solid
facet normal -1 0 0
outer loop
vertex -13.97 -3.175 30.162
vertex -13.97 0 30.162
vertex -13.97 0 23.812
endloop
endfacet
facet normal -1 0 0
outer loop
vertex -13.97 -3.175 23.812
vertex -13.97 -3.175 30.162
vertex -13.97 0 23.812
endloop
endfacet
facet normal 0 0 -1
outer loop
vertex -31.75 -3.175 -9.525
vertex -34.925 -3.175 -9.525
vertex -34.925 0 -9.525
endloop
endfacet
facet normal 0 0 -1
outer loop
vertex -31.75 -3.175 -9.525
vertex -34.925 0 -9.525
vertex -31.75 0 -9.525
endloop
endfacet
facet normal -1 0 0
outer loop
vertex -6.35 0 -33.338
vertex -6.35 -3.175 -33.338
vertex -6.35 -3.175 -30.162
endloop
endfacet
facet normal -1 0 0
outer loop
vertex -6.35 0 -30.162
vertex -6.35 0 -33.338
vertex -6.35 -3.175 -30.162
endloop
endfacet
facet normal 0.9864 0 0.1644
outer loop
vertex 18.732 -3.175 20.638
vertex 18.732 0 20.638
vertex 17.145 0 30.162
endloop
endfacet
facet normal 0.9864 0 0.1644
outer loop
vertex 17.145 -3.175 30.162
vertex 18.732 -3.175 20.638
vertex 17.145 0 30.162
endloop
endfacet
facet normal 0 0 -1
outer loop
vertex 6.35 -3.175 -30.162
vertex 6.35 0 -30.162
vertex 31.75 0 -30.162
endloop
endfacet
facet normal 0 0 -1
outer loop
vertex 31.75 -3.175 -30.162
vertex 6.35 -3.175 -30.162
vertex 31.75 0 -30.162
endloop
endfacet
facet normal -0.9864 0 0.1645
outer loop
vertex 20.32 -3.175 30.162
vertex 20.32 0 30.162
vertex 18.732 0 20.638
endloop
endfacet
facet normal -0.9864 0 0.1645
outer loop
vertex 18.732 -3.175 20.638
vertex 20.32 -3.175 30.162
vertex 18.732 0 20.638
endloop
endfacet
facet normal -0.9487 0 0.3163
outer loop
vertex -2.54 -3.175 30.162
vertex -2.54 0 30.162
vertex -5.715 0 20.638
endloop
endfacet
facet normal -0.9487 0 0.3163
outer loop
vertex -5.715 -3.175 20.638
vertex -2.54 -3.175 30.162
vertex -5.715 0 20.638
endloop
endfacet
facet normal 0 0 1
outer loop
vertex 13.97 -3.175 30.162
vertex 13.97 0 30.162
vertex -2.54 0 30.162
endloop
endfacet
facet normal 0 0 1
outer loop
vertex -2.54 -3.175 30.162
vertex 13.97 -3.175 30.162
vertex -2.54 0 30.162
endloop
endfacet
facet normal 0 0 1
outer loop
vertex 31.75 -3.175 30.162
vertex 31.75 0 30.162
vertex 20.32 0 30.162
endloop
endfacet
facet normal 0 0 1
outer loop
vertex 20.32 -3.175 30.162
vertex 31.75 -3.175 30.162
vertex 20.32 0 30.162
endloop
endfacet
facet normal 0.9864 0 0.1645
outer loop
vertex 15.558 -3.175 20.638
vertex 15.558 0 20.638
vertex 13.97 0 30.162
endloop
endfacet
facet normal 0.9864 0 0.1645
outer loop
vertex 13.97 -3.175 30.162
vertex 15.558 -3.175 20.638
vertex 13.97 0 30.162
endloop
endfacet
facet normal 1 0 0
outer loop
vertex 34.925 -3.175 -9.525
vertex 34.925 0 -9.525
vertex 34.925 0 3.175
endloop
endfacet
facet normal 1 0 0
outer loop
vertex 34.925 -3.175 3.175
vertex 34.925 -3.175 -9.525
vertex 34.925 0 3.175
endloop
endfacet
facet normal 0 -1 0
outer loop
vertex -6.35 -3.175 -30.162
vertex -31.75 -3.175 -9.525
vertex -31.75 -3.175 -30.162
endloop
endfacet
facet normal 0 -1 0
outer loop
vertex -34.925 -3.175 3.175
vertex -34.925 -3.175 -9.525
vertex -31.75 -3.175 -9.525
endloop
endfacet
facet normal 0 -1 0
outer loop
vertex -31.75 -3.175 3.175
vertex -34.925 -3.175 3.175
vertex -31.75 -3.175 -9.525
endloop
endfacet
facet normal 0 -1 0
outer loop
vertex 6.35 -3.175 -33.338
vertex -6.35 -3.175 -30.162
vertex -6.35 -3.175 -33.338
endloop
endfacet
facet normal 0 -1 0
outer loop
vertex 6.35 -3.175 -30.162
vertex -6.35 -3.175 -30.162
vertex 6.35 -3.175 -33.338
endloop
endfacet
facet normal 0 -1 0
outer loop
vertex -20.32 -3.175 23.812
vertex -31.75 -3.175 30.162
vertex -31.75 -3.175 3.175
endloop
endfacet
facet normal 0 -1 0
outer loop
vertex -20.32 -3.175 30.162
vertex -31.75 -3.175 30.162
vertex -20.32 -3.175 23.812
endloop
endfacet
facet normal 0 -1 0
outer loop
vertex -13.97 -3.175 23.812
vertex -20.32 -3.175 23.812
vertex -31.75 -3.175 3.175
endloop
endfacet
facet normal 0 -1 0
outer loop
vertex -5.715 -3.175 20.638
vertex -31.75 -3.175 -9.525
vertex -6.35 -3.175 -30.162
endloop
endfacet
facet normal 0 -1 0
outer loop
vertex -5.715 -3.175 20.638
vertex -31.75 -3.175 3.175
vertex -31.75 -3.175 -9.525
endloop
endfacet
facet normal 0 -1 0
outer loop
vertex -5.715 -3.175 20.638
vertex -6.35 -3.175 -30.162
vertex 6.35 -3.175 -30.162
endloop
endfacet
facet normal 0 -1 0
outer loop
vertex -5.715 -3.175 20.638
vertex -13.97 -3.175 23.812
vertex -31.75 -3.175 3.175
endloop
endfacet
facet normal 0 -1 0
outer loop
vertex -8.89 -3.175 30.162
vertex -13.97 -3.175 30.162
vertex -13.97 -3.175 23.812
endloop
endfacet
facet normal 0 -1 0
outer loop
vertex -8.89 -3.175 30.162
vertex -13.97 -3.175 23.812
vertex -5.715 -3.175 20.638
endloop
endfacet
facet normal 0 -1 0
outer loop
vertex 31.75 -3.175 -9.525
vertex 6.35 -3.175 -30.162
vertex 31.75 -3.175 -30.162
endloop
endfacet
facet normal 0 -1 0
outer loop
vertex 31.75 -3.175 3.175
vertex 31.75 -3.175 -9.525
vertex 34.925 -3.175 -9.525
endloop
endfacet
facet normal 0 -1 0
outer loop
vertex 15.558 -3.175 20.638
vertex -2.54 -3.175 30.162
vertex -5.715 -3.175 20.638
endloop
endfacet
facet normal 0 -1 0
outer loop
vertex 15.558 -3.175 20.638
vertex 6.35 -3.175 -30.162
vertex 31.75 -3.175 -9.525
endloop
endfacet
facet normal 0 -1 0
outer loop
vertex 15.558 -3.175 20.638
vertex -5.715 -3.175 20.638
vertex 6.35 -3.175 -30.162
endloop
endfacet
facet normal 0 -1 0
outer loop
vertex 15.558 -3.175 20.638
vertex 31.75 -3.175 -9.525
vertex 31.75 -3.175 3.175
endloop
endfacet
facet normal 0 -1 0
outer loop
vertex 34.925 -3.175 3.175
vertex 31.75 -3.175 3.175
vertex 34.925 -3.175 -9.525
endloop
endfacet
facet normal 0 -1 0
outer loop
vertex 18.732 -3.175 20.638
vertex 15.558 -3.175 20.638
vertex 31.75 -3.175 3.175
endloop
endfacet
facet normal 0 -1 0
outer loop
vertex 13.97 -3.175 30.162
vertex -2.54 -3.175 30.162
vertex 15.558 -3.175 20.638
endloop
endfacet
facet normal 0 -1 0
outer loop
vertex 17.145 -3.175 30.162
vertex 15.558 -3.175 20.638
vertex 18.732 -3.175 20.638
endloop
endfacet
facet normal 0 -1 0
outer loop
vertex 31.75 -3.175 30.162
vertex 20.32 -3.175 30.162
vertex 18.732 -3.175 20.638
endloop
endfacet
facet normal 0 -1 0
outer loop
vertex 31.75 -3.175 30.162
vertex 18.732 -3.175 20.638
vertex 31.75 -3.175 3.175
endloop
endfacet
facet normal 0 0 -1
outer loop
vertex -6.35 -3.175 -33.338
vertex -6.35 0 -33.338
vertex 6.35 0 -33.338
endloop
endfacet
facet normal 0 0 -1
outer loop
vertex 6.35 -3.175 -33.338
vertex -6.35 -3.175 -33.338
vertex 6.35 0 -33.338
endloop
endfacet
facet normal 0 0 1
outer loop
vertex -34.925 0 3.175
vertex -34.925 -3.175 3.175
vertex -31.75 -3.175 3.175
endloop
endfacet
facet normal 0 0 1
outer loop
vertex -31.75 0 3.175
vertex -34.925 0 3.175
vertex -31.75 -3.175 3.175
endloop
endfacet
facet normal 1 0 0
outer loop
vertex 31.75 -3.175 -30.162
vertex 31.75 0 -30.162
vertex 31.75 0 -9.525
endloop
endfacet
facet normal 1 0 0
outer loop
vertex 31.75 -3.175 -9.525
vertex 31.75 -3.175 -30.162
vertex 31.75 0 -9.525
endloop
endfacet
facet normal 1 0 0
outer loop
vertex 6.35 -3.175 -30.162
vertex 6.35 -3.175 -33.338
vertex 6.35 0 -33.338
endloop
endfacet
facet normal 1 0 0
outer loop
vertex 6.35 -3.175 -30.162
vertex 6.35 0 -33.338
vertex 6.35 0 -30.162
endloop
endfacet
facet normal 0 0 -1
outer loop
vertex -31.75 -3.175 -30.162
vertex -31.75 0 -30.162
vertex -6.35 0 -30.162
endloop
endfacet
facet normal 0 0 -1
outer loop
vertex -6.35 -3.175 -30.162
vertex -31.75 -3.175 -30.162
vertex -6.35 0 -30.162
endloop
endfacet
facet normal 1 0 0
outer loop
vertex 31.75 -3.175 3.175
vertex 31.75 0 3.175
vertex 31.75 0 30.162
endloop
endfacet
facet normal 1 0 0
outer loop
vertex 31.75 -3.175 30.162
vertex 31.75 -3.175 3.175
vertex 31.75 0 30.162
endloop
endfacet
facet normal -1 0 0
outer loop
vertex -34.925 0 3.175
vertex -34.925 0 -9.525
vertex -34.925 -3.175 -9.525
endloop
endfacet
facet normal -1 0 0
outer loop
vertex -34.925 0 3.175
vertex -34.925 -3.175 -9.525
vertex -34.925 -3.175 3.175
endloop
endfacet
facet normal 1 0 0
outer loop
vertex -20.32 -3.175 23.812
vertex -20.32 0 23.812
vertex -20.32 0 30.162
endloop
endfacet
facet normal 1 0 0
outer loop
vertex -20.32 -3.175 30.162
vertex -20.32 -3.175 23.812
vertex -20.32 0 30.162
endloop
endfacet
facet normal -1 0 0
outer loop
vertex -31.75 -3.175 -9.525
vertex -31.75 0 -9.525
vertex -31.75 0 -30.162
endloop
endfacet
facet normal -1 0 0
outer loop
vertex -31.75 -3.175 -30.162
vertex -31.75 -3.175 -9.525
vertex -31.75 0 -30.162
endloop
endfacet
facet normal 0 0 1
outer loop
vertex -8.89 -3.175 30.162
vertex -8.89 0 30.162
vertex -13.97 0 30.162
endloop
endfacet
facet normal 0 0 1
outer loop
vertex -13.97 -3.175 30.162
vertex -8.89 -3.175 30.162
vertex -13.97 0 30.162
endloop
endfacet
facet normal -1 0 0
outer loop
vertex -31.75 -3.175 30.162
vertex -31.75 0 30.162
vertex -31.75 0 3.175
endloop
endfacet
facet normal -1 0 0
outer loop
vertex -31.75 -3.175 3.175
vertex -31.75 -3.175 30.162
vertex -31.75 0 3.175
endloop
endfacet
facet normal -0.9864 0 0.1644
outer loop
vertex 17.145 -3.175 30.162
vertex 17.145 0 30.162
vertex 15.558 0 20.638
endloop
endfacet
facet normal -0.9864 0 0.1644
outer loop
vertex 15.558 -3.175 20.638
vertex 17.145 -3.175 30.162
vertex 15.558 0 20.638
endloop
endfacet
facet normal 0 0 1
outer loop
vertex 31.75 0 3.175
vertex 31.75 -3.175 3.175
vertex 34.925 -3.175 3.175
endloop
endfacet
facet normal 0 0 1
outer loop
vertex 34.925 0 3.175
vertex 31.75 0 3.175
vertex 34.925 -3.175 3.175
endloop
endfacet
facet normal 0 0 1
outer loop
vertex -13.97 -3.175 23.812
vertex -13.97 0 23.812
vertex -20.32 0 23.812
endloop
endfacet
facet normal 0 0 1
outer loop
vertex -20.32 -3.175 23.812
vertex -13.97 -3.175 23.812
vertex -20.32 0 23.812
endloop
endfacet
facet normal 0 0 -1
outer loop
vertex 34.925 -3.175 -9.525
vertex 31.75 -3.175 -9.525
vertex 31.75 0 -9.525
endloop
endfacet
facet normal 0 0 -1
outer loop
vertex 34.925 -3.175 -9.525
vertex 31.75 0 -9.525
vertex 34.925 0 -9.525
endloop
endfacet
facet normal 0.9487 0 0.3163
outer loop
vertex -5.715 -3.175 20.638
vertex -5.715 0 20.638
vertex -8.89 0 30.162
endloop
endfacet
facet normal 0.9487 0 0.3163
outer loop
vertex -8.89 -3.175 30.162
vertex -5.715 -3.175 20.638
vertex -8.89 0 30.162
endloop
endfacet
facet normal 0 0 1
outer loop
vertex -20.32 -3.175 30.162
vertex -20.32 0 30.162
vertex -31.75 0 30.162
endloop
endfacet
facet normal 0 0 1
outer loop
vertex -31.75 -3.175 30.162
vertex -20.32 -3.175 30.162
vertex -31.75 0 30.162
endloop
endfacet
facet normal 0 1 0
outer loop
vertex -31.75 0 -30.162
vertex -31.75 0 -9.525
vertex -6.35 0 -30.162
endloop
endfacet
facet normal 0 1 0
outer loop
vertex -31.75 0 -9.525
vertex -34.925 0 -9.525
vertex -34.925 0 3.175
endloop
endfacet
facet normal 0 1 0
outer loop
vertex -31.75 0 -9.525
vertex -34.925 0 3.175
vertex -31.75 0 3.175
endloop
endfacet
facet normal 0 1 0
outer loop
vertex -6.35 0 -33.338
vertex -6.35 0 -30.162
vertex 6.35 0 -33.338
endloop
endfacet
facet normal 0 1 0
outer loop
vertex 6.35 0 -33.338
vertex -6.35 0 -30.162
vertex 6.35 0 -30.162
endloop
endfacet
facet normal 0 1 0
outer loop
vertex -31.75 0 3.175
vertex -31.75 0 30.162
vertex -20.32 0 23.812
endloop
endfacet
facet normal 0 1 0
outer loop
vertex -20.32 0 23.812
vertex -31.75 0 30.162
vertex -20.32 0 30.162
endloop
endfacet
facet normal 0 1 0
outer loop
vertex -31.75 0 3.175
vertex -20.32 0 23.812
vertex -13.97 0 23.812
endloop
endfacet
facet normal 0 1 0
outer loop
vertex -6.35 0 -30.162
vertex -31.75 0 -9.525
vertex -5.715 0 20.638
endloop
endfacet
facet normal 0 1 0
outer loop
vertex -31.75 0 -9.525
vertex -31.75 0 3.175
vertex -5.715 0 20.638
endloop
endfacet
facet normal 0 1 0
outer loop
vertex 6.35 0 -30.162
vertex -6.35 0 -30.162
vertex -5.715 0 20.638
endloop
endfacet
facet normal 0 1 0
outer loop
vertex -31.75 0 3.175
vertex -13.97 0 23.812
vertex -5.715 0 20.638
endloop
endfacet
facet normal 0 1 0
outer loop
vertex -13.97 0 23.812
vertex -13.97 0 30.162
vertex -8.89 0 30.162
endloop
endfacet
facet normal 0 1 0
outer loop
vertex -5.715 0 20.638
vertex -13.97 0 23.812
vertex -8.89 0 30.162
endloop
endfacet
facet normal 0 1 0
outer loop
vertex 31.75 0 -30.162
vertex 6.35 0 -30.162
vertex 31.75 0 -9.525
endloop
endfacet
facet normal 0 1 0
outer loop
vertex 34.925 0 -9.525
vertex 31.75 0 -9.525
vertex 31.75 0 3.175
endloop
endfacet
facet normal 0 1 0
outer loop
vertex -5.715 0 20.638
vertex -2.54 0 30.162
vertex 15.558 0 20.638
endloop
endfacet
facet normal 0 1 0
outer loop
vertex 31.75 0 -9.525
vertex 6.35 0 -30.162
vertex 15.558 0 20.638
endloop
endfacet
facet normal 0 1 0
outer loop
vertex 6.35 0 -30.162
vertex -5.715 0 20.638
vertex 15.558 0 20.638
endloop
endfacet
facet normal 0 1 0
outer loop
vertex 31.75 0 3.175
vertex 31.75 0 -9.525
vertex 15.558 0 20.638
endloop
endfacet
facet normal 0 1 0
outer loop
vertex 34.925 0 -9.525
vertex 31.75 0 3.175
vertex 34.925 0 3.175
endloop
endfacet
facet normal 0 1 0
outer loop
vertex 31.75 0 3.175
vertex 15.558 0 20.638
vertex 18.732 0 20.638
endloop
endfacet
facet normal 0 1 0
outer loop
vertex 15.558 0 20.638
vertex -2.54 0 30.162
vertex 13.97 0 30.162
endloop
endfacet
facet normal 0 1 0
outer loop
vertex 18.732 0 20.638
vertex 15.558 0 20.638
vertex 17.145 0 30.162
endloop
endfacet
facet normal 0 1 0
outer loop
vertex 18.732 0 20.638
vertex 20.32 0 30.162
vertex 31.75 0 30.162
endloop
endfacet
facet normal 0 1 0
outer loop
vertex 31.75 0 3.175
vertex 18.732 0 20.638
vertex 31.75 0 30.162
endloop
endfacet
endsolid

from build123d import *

# Parameters (mm, degrees)
F0_W     = 3.175
F0_H     = 12.7
F0_W_2   = 12.7
F0_H_2   = 3.175
F1_DEPTH = 3.175


with BuildPart() as f1:
    # F0 (on Front) → F1 (new body)
    with BuildSketch(Plane.XZ):
        Polygon((-20.32, 30.1625), (-31.75, 30.1625), (-31.75, 3.175), (-31.75, -9.525), (-31.75, -30.1625), (-6.35, -30.1625), (6.35, -30.1625), (31.75, -30.1625), (31.75, -9.525), (31.75, 3.175), (31.75, 30.1625), (20.32, 30.1625), (18.7325, 20.6375), (17.145, 30.1625), (15.5575, 20.6375), (13.97, 30.1625), (-2.54, 30.1625), (-5.715, 20.6375), (-8.89, 30.1625), (-13.97, 30.1625), (-13.97, 23.8125), (-20.32, 23.8125), align=None)
        with Locations((33.3375, -3.175)):
            Rectangle(F0_W, F0_H)
        with Locations((0, -31.75)):
            Rectangle(F0_W_2, F0_H_2)
        with Locations((-33.3375, -3.175)):
            Rectangle(F0_W, F0_H)
    extrude(amount=F1_DEPTH)


solid = f1.part
